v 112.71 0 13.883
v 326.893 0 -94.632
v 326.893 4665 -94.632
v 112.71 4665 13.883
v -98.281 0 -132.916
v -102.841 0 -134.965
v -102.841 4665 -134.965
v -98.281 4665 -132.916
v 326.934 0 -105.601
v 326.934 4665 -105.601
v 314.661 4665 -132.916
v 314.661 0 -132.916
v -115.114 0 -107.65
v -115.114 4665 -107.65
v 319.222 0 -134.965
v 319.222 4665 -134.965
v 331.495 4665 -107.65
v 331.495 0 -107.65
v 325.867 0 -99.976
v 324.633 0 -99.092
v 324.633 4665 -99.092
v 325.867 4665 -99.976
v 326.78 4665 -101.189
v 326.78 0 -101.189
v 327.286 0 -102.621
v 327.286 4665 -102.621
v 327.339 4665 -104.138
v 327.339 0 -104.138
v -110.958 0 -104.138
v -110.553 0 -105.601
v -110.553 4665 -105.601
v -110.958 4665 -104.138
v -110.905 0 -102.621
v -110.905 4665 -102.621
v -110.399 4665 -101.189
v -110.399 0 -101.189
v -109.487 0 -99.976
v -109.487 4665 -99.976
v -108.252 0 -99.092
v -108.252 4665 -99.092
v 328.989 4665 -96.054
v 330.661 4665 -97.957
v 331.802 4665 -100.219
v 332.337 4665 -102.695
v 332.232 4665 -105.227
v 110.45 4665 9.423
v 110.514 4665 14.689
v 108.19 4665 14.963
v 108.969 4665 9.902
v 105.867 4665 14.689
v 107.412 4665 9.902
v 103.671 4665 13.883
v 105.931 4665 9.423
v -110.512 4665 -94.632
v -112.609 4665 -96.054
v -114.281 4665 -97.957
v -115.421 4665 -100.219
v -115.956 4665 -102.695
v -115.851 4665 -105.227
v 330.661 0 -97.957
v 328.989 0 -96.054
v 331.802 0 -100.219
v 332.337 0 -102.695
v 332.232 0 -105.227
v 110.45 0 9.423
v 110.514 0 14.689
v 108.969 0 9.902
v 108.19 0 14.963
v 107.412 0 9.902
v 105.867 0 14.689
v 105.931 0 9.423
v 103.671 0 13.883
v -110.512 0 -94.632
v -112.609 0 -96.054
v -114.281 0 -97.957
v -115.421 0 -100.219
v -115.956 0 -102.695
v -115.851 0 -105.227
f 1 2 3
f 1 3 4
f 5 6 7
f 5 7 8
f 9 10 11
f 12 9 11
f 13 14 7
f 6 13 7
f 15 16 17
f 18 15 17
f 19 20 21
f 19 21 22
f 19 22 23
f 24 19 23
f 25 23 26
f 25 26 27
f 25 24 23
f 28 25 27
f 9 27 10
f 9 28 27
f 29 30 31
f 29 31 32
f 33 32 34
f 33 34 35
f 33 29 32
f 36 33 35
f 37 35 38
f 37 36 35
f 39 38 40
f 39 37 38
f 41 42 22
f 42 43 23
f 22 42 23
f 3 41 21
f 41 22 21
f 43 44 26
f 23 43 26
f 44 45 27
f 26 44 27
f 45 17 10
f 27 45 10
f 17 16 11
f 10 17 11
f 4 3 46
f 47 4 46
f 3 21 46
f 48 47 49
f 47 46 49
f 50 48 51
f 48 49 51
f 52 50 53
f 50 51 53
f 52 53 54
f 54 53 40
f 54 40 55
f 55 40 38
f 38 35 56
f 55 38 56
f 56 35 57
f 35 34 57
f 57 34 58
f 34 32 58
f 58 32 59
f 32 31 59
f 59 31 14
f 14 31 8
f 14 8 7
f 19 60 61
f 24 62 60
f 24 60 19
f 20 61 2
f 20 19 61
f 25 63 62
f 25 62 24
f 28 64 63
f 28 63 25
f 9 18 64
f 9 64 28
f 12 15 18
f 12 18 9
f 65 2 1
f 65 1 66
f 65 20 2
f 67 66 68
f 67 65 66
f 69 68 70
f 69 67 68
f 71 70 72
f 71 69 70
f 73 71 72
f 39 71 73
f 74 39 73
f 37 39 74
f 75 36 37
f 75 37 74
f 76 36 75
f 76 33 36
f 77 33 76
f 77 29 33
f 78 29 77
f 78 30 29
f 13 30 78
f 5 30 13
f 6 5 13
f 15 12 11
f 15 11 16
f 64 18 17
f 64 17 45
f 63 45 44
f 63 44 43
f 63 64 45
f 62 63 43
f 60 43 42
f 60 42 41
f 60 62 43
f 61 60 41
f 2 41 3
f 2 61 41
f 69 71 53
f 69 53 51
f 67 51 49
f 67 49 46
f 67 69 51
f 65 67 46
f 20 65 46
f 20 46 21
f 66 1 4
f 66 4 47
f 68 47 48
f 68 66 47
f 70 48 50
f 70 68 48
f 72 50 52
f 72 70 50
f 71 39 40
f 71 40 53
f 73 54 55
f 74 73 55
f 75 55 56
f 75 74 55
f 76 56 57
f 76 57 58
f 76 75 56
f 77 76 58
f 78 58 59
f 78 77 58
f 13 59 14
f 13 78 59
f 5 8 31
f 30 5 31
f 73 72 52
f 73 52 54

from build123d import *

# Parameters (mm, degrees)
BOSS_EXTRUDE2_DEPTH = 4665


with BuildPart() as part:
    # Sketch1 → Boss-Extrude2 (new body)
    with BuildSketch(Plane(origin=(0, 0, 0), x_dir=(1, 0, 0), z_dir=(0, 1, 0))):
        with BuildLine():
            Line((319.222222222, 134.965277778), (331.494858512, 107.65046142))
            ThreePointArc((331.494858512, 107.65046142), (331.801527991, 100.219250383), (326.892771492, 94.631670113))
            Line((326.892771492, 94.631670113), (112.709917293, -13.883323219))
            ThreePointArc((112.709917293, -13.883323219), (108.190412513, -14.962892929), (103.670907733, -13.883323219))
            Line((103.670907733, -13.883323219), (-110.511946465, 94.631670113))
            ThreePointArc((-110.511946465, 94.631670113), (-115.420702964, 100.219250383), (-115.114033485, 107.65046142))
            Line((-115.114033485, 107.65046142), (-102.841397196, 134.965277778))
            Line((-102.841397196, 134.965277778), (-98.280601295, 132.916097269))
            Line((-98.280601295, 132.916097269), (-110.553237585, 105.601280911))
            ThreePointArc((-110.553237585, 105.601280911), (-110.706572325, 101.885675393), (-108.252194075, 99.091885258))
            Line((-108.252194075, 99.091885258), (105.930660123, -9.423108074))
            ThreePointArc((105.930660123, -9.423108074), (108.190412513, -9.962892929), (110.450164903, -9.423108074))
            Line((110.450164903, -9.423108074), (324.633019102, 99.091885258))
            ThreePointArc((324.633019102, 99.091885258), (327.087397351, 101.885675393), (326.934062612, 105.601280911))
            Line((326.934062612, 105.601280911), (314.661426322, 132.916097269))
            Line((314.661426322, 132.916097269), (319.222222222, 134.965277778))
        make_face()
    extrude(amount=BOSS_EXTRUDE2_DEPTH)


solid = part.part
